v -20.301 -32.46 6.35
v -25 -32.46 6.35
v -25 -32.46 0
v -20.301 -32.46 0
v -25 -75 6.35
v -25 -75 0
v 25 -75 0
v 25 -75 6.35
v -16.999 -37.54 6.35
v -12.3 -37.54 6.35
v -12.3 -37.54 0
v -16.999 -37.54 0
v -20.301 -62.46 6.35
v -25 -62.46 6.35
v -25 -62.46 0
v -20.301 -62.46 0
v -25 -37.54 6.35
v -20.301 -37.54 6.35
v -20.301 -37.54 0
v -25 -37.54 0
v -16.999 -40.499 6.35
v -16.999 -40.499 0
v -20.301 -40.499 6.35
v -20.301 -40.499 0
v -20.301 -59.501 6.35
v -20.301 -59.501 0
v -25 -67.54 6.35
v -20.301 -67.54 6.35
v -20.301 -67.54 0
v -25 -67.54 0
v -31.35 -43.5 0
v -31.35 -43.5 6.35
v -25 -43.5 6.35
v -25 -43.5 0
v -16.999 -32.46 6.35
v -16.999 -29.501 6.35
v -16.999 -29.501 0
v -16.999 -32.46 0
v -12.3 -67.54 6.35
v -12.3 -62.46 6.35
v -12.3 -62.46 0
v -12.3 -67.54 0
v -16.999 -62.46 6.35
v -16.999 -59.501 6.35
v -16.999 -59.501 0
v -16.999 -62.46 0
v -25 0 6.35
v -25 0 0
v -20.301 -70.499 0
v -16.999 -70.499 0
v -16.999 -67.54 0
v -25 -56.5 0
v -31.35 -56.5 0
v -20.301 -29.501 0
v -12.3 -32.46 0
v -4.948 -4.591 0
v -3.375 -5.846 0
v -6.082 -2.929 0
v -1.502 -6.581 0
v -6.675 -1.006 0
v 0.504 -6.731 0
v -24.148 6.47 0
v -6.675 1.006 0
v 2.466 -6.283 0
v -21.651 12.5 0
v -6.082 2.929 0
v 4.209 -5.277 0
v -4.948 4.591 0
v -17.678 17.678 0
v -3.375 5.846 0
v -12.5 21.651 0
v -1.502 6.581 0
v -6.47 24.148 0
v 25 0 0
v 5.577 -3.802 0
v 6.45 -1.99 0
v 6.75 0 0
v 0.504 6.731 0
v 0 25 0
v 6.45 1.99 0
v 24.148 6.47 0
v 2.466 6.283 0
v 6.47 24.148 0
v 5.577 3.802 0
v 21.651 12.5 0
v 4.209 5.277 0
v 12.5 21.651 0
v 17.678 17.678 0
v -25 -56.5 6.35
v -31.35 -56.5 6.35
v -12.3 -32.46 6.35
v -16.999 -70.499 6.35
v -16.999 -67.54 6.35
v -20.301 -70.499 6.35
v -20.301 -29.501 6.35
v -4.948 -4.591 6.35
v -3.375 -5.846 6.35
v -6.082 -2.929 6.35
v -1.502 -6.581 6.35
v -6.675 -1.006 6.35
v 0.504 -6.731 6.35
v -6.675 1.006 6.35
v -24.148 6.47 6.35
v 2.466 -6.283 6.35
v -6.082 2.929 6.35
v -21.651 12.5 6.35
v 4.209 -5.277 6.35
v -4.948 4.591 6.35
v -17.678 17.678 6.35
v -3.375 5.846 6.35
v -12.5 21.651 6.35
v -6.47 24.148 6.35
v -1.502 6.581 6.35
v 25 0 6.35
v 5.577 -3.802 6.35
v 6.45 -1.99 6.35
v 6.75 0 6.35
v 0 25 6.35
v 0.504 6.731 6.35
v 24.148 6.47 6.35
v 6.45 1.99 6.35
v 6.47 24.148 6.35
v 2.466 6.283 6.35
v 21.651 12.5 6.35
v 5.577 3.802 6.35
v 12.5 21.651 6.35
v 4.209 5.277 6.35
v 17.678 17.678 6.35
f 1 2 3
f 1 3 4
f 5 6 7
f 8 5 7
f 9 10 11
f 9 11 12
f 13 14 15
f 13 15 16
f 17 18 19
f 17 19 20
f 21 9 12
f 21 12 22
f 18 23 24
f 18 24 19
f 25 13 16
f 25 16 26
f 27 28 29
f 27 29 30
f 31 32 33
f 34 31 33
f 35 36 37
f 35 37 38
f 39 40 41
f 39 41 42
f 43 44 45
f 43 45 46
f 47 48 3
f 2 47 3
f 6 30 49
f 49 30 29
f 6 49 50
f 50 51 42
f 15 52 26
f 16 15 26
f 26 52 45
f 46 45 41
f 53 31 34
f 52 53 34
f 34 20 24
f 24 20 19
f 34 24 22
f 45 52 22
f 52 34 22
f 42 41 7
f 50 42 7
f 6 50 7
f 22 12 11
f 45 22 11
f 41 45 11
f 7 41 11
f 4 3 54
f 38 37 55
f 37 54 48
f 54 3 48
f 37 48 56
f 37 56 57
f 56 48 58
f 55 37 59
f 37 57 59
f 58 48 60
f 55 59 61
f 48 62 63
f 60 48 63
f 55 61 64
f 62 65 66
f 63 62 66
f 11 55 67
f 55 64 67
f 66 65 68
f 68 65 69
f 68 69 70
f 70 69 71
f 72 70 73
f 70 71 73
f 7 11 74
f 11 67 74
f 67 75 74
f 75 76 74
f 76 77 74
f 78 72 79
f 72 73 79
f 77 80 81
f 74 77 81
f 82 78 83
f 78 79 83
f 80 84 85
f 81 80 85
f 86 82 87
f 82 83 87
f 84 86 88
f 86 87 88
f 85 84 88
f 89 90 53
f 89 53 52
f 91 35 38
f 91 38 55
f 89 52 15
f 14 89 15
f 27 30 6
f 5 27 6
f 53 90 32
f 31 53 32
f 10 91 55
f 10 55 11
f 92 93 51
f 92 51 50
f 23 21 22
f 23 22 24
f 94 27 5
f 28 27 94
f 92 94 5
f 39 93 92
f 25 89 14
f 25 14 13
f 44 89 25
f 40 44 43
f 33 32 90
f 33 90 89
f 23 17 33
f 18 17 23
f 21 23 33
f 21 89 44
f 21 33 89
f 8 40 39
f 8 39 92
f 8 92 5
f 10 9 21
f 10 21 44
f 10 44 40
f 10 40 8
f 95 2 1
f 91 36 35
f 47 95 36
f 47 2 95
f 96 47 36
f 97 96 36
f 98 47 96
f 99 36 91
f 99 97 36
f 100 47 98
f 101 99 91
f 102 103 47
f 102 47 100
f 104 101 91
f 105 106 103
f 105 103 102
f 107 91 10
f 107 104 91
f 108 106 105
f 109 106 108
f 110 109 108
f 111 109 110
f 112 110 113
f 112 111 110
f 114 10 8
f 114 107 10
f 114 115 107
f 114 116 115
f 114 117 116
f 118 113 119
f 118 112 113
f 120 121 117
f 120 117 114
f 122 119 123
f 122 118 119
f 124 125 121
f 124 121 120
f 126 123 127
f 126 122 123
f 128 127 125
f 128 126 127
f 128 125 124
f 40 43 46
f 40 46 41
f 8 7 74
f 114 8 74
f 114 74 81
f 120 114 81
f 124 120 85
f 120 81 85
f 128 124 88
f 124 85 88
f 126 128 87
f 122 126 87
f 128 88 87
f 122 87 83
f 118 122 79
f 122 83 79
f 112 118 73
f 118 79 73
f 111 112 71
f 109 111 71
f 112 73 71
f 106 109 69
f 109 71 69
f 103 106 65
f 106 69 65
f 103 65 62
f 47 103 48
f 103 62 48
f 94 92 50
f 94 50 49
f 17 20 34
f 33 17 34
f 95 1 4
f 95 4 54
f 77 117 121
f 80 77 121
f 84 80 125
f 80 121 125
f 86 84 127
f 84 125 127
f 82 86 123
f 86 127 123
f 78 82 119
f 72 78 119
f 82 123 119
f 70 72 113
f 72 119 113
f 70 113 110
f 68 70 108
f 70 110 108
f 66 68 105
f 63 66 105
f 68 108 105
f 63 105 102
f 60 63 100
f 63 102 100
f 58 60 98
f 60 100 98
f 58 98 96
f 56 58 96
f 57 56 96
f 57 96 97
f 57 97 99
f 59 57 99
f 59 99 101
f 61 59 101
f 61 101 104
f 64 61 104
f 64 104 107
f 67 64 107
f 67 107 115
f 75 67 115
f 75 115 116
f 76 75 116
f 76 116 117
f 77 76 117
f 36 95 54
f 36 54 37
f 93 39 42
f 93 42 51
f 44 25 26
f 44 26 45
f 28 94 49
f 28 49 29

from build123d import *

# Parameters (mm, degrees)
BOSS_EXTRUDE1_DEPTH = 6.35
CUT_EXTRUDE1_DEPTH  = 6.35
LPATTERN1_COUNT     = 2
LPATTERN1_PITCH     = 30
SKETCH4_W           = 6.35
SKETCH4_H           = 13
BOSS_EXTRUDE2_DEPTH = 6.35
SKETCH5_R           = 6.75
CUT_EXTRUDE2_DEPTH  = 82.536157623


with BuildPart() as part:
    # Sketch2 → Boss-Extrude1 (new body)
    with BuildSketch(Plane.XY):
        with BuildLine():
            Line((-25, 0), (-25, -75))
            Line((-25, -75), (25, -75))
            Line((25, -75), (25, 0))
            ThreePointArc((25, 0), (0, 25), (-25, 0))
        make_face()
    extrude(amount=BOSS_EXTRUDE1_DEPTH)

    # Sketch3 → Cut-Extrude1 (cut)
    with BuildSketch(Plane.XY.offset(6.35)):
        Polygon((-12.3, -67.54), (-16.999, -67.54), (-16.999, -70.4991), (-20.301, -70.4991), (-20.301, -67.54), (-25, -67.54), (-25, -62.46), (-20.301, -62.46), (-20.301, -59.5009), (-16.999, -59.5009), (-16.999, -62.46), (-12.3, -62.46), align=None)
    cut_extrude1 = extrude(amount=-CUT_EXTRUDE1_DEPTH, mode=Mode.SUBTRACT)

    # LPattern1: Cut-Extrude1 ×2
    with Locations(*[(0, i * LPATTERN1_PITCH, 0) for i in range(1, LPATTERN1_COUNT)]):
        add(cut_extrude1, mode=Mode.SUBTRACT)

    # Sketch4 → Boss-Extrude2 (add)
    with BuildSketch(Plane.XY.offset(6.35)):
        with Locations((-28.175, -50)):
            Rectangle(SKETCH4_W, SKETCH4_H)
    extrude(amount=-BOSS_EXTRUDE2_DEPTH)

    # Sketch5 → Cut-Extrude2 (cut, through all)
    with BuildSketch(Plane.XY.offset(6.35)):
        Circle(SKETCH5_R)
    extrude(amount=-CUT_EXTRUDE2_DEPTH, mode=Mode.SUBTRACT)


solid = part.part
